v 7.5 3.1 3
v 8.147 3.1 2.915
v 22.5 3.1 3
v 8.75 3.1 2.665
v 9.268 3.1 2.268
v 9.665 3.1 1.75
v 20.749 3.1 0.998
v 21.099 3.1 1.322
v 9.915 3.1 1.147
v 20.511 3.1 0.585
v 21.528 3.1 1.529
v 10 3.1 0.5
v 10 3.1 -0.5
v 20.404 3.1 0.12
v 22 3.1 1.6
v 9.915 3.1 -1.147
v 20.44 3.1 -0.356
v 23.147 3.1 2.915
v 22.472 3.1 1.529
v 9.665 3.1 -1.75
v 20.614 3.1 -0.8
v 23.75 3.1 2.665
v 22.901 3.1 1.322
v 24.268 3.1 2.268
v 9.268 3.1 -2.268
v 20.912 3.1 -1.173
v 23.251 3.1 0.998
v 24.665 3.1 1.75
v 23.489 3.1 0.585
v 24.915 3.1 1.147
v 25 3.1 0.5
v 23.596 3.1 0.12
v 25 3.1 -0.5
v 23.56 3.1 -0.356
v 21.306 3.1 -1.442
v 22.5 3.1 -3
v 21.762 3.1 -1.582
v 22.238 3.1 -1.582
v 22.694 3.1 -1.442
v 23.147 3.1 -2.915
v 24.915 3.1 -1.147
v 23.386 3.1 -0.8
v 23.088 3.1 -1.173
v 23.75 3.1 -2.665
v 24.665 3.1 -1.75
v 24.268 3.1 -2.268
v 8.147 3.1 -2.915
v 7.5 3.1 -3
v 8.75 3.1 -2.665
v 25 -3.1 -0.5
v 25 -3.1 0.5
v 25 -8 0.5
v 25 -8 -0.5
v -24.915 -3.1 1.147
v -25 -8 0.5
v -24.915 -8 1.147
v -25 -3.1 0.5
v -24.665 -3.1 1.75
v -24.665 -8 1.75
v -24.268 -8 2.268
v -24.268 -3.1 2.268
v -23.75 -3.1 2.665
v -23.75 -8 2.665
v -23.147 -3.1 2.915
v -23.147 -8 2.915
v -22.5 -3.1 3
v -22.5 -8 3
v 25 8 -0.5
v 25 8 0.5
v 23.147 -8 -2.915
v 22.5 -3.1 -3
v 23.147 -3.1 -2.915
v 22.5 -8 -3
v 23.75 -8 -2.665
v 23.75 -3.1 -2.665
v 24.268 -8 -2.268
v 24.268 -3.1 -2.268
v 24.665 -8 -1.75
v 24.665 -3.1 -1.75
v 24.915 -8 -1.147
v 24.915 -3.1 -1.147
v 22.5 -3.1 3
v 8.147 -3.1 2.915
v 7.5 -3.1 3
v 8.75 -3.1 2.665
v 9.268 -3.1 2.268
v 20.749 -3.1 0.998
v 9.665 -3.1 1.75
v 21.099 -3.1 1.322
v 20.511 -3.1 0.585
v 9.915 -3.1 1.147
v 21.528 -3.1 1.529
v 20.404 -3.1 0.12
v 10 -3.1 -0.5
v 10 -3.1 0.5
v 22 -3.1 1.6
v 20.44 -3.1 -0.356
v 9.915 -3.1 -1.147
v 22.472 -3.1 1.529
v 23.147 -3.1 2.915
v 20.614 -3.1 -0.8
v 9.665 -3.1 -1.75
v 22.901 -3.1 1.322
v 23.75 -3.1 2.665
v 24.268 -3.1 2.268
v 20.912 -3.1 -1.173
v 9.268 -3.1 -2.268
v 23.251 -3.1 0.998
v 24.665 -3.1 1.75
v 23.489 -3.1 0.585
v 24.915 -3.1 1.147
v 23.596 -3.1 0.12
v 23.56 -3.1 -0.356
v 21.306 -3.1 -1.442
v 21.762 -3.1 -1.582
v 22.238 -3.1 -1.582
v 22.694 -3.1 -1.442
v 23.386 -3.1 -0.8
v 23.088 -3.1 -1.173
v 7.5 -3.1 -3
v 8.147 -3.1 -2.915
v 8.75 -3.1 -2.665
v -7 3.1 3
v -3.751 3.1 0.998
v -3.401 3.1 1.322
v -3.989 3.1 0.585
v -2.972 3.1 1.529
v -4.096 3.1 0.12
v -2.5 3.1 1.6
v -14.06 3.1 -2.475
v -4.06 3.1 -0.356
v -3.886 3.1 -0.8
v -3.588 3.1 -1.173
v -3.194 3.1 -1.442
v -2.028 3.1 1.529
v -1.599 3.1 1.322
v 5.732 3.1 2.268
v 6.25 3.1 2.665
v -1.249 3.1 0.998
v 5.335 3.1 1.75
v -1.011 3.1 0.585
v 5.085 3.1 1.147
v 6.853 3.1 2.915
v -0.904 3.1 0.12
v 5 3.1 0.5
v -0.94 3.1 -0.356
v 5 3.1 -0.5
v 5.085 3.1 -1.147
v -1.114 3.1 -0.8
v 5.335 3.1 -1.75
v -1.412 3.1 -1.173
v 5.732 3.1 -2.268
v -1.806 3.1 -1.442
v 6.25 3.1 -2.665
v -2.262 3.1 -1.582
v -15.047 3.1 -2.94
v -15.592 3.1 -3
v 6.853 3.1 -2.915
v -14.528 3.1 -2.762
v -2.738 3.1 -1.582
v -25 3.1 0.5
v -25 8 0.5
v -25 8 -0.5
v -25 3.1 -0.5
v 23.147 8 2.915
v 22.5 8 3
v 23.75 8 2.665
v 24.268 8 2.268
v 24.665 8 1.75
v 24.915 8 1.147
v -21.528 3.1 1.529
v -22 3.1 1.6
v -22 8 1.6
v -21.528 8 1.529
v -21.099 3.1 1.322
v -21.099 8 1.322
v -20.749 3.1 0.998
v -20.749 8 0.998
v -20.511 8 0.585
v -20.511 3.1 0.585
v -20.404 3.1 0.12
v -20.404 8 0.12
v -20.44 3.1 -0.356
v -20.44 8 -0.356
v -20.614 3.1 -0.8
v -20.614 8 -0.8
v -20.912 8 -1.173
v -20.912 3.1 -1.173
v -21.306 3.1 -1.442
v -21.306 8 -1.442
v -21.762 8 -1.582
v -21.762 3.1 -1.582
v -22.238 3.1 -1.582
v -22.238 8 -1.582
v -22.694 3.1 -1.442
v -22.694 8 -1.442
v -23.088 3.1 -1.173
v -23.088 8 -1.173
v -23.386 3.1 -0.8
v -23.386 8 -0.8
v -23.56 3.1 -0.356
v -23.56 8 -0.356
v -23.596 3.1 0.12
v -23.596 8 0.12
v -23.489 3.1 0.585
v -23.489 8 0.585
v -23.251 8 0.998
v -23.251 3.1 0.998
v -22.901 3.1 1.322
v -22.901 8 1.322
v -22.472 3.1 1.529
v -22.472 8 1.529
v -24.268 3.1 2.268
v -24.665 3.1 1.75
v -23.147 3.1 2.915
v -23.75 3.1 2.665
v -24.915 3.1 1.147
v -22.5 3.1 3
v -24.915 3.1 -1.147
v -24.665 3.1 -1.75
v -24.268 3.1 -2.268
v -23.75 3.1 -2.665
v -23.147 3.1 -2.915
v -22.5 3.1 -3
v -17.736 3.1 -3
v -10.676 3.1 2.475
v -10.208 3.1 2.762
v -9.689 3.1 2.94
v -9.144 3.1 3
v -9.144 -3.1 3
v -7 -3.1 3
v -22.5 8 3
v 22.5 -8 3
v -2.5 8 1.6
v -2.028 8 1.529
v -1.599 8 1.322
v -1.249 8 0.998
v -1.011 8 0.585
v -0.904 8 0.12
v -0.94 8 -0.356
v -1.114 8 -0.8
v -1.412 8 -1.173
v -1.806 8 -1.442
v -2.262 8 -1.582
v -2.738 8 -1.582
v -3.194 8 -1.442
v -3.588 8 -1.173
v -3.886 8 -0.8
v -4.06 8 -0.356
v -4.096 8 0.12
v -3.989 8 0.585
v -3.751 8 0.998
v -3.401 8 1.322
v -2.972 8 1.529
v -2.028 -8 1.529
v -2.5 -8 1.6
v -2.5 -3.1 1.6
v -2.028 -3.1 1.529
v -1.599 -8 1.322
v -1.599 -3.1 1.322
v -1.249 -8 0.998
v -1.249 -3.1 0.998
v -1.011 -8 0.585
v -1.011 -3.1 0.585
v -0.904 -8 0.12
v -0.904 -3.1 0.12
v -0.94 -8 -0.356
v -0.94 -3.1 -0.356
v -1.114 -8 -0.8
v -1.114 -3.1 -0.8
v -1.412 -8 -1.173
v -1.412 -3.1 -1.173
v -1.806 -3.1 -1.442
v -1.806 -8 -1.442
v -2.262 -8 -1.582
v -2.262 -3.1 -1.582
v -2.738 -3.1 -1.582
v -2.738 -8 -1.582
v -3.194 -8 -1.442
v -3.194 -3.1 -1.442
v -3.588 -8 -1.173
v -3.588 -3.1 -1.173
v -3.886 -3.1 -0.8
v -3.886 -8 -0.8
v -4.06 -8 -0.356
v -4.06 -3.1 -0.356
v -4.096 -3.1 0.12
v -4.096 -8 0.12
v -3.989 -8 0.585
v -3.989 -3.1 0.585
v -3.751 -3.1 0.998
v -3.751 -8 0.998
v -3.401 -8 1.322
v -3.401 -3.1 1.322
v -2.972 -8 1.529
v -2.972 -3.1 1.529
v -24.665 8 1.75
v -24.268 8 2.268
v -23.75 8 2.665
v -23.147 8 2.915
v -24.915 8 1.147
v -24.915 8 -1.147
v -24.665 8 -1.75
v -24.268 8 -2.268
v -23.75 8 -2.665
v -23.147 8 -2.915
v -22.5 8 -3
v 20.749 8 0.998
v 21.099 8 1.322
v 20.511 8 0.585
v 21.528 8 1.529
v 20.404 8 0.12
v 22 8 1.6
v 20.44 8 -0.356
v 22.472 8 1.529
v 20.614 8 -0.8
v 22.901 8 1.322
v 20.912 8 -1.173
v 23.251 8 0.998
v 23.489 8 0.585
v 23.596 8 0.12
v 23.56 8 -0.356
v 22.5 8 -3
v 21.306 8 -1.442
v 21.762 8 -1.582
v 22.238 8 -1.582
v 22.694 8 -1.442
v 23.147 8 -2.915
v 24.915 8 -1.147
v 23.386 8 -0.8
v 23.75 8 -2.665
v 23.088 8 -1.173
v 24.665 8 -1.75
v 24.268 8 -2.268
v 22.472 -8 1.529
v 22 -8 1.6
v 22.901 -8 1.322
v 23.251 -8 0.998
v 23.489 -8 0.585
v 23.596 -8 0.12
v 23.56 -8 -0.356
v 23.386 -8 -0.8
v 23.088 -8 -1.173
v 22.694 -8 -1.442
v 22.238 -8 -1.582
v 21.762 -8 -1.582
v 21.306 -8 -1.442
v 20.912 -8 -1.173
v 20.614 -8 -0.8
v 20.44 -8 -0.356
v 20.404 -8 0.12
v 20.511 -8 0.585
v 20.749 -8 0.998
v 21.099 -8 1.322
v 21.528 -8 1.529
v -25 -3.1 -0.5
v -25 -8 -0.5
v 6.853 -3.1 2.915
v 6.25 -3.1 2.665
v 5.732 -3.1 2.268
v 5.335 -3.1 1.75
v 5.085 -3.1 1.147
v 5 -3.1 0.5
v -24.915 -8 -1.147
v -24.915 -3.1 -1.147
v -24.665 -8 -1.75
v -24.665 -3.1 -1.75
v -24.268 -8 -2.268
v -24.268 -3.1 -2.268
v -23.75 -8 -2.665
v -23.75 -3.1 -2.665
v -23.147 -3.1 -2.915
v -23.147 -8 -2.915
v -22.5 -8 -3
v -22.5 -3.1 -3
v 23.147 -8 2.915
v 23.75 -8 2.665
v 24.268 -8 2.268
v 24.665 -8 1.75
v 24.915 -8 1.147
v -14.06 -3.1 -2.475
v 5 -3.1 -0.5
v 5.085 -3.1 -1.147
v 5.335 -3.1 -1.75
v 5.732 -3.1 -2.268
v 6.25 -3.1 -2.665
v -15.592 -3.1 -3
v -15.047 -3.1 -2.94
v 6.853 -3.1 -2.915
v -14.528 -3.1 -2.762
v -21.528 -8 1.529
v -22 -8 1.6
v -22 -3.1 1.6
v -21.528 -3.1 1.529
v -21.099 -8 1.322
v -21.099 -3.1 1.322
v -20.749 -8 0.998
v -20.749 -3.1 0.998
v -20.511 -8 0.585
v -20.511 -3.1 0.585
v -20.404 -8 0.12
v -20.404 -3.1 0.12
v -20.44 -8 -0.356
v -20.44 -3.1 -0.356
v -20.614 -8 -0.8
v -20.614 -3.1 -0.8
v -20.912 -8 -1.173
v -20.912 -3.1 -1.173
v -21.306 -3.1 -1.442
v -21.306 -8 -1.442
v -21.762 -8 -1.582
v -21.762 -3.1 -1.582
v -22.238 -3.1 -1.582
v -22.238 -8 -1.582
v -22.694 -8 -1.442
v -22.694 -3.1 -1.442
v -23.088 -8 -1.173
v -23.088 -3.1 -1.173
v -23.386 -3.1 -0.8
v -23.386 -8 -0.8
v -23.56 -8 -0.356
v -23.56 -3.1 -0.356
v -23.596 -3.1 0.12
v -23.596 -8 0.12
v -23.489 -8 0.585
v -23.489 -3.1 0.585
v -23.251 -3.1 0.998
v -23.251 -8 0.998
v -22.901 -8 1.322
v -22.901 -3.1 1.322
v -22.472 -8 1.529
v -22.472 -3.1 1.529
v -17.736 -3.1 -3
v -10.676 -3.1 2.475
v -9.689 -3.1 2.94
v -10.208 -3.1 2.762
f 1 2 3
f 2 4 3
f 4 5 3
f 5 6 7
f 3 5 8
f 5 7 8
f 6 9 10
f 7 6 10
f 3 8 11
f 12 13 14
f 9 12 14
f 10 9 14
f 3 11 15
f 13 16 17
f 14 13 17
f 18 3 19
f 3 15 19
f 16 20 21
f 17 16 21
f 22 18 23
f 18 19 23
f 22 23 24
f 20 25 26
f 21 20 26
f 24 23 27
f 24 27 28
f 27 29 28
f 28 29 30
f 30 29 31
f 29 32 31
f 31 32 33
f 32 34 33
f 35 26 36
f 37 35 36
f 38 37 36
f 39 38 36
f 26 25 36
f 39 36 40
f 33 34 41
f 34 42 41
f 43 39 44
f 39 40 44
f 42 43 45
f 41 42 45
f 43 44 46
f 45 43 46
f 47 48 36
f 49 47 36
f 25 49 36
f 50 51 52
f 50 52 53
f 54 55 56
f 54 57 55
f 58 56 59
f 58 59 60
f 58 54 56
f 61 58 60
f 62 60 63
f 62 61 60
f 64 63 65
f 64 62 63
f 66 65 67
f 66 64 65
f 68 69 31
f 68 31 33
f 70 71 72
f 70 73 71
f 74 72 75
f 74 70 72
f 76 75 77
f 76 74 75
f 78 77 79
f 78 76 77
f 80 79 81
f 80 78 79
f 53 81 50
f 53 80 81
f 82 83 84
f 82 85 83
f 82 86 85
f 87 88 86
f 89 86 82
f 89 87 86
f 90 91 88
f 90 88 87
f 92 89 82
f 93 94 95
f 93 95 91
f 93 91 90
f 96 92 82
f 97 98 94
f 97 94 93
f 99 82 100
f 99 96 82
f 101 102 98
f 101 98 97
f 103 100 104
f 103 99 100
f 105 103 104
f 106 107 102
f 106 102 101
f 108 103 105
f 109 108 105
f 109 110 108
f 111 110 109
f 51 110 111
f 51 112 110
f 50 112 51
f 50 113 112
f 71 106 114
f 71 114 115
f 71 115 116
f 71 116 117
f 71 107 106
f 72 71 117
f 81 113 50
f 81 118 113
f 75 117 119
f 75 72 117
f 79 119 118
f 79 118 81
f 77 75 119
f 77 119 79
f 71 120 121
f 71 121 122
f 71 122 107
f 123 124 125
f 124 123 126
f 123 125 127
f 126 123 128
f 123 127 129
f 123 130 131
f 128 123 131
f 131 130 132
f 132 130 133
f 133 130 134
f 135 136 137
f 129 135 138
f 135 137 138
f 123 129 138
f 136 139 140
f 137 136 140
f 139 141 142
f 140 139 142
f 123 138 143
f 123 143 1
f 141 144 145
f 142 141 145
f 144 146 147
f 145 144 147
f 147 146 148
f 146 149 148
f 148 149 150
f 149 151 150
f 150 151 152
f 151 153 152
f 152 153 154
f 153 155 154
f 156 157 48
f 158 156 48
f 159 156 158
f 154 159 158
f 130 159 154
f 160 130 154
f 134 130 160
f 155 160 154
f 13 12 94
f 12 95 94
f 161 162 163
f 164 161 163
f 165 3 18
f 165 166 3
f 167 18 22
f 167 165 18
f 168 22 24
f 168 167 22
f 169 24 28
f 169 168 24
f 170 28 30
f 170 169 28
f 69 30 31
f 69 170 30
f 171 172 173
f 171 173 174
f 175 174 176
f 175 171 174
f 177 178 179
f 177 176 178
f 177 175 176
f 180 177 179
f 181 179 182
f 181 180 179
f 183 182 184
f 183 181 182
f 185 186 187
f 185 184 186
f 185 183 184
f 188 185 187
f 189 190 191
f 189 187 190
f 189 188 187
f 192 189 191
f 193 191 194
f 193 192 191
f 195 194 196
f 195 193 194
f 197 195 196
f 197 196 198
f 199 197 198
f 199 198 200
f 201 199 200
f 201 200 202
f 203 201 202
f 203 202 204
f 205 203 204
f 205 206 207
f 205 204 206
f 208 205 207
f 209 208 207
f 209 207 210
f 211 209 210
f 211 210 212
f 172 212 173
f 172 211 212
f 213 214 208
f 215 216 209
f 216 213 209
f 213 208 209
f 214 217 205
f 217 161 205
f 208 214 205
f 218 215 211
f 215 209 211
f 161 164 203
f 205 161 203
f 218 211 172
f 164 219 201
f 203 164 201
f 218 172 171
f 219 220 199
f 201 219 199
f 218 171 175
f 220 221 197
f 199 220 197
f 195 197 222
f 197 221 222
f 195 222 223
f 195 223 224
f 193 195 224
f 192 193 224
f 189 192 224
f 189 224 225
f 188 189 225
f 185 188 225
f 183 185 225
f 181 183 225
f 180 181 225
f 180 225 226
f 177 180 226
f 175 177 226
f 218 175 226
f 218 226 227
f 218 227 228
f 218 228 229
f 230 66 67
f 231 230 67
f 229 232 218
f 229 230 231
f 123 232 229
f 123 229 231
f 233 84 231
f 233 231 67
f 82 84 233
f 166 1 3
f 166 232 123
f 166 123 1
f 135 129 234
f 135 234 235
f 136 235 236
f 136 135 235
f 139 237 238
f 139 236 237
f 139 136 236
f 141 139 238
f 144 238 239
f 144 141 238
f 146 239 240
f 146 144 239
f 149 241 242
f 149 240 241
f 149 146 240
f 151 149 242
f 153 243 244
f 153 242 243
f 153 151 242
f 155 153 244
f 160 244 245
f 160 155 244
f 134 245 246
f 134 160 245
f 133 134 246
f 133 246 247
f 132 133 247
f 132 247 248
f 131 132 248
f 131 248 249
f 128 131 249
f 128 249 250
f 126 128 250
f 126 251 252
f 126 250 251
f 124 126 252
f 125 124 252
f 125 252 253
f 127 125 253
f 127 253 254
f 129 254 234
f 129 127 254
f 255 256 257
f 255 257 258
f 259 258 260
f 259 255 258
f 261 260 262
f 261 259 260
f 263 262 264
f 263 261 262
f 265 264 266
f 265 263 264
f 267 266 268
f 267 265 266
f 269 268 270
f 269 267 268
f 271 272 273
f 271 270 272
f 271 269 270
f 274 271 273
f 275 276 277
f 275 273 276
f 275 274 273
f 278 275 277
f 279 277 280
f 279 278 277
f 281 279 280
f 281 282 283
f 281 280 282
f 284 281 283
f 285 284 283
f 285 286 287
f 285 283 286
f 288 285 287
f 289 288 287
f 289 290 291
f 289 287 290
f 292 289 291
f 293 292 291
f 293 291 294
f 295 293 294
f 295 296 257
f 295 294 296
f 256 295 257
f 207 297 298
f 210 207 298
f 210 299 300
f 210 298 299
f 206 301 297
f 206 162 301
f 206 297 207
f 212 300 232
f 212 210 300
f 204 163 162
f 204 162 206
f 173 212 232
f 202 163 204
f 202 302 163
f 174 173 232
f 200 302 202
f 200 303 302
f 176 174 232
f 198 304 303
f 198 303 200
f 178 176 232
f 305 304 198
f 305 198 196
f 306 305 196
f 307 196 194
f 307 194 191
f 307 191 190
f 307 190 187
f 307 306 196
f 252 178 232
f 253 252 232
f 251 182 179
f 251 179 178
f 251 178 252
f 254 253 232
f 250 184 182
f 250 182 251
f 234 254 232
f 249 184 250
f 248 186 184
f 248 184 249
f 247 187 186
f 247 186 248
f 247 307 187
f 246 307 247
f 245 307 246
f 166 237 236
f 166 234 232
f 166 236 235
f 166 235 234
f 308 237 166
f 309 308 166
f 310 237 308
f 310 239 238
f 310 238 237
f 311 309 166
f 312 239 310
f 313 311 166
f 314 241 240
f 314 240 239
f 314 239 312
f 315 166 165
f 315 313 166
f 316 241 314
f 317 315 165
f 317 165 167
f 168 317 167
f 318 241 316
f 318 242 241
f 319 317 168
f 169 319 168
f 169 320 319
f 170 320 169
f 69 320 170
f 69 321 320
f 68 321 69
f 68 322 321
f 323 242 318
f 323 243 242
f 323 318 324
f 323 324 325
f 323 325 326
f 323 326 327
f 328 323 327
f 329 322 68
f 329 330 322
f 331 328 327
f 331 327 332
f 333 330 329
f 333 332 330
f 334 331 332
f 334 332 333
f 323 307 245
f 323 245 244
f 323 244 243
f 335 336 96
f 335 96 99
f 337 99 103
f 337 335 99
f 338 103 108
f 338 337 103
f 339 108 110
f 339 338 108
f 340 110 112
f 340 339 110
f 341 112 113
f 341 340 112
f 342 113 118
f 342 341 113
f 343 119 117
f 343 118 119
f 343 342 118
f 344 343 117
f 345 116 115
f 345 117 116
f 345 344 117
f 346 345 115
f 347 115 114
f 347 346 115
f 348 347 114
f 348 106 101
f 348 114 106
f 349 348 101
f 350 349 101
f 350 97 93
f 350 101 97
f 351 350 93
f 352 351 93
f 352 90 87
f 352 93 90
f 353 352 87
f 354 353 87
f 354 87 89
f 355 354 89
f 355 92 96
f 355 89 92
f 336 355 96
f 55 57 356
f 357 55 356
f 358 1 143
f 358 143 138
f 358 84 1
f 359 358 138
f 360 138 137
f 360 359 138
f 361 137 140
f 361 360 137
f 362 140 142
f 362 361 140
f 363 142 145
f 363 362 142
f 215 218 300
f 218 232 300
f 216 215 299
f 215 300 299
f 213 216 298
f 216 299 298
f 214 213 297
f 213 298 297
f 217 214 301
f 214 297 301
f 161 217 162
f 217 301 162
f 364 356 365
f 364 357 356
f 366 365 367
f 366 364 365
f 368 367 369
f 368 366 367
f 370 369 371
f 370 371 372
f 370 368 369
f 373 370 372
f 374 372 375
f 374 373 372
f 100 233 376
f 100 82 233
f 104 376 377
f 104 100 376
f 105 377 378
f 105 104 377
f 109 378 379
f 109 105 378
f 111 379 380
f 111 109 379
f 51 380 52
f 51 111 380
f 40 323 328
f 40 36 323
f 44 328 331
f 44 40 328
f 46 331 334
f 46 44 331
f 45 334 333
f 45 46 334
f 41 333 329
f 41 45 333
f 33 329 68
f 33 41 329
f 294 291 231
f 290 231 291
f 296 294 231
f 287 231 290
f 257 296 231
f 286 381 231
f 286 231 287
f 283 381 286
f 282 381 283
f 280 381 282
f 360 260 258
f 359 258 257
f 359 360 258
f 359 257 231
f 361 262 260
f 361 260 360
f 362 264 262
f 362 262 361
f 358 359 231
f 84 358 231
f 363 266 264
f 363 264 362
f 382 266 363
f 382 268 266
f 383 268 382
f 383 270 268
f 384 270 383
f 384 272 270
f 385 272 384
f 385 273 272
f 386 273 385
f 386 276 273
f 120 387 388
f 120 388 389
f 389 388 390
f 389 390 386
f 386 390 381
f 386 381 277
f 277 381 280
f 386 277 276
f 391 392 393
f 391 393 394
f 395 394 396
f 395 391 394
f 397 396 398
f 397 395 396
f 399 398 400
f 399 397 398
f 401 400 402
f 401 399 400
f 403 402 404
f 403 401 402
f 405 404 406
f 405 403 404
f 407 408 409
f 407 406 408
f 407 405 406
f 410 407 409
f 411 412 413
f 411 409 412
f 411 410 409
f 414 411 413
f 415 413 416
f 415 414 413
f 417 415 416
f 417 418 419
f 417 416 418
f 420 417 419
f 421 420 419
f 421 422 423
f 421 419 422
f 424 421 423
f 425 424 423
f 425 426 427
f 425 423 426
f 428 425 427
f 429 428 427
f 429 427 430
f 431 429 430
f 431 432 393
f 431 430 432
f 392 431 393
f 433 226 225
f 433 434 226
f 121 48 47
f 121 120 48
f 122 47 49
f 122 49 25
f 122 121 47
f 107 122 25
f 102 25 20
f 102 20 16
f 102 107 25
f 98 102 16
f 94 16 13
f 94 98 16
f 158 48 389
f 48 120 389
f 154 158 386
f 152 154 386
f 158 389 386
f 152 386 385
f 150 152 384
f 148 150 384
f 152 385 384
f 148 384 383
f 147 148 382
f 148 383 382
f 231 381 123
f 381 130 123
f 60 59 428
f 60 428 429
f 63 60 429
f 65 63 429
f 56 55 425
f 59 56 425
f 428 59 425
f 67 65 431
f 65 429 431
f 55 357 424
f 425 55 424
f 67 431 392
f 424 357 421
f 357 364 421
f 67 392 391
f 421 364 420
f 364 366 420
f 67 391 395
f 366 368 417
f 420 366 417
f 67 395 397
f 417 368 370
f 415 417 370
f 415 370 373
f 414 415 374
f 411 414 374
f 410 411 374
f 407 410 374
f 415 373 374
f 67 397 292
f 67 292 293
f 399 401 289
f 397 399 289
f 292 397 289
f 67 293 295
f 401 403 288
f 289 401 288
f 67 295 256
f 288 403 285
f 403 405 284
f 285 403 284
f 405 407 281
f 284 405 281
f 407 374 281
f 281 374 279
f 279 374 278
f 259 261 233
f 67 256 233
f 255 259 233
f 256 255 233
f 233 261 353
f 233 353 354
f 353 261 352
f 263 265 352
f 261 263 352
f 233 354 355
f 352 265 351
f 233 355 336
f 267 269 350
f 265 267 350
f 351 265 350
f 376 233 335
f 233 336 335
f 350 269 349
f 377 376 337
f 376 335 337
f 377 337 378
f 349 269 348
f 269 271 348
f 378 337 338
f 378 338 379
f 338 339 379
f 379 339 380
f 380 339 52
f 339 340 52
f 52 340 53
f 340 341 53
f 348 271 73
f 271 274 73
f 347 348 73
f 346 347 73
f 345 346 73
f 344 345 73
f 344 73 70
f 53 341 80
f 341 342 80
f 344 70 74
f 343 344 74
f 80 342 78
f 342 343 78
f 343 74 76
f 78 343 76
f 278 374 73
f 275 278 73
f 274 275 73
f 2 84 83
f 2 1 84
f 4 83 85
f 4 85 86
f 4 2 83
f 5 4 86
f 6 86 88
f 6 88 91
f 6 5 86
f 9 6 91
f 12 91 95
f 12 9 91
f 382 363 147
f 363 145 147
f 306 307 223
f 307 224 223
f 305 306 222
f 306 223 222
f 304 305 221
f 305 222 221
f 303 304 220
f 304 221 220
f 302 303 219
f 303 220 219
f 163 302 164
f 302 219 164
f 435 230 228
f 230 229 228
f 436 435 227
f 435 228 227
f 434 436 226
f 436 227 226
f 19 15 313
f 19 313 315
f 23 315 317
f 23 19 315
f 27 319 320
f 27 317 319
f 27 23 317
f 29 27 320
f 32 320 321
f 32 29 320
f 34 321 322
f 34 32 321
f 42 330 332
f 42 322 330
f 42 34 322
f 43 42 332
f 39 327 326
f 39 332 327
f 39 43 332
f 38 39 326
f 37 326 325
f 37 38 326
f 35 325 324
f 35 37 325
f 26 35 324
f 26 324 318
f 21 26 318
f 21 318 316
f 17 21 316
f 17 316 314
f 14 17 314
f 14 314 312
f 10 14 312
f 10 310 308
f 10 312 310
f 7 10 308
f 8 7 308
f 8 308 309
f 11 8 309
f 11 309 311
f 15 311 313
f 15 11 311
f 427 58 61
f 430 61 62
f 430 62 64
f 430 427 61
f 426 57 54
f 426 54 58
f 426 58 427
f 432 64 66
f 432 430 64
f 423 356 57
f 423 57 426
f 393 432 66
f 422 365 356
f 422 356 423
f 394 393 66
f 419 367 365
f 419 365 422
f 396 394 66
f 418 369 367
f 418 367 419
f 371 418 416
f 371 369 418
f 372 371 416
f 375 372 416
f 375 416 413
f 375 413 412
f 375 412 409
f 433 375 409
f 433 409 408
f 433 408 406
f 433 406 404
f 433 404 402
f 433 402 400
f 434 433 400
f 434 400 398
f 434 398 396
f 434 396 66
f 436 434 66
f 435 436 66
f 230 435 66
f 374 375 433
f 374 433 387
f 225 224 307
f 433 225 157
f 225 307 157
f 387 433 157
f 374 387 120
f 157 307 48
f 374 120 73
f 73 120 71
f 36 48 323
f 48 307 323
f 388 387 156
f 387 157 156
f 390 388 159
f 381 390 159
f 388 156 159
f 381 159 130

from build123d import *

# Parameters (mm, degrees)
SKETCH1_W               = 50
SKETCH1_H               = 6
BOSS_EXTRUDE1_DEPTH     = 8
SKETCH2_W               = 15
SKETCH2_H               = 6
CUT_EXTRUDE1_DEPTH      = 3.1
CUT_EXTRUDE2_DEPTH      = 27.419689627
CUT_EXTRUDE2_DEPTH_BACK = 27.419689627
SKETCH3_R               = 1.6
FILLET1_R               = 2.5


with BuildPart() as part:
    # Sketch1 → Boss-Extrude1 (new, symmetric)
    with BuildSketch(Plane(origin=(0, 0, 0), x_dir=(1, 0, 0), z_dir=(0, 1, 0))):
        Rectangle(SKETCH1_W, SKETCH1_H)
    extrude(amount=BOSS_EXTRUDE1_DEPTH, both=True)

    # Sketch2 → Cut-Extrude1 (cut, symmetric)
    with BuildSketch(Plane(origin=(0, 0, 0), x_dir=(1, 0, 0), z_dir=(0, 1, 0))):
        Polygon((-25, -3), (-10, -3), (-17.736081979, 3), (-25, 3), align=None)
        with Locations((17.5, 0)):
            Rectangle(SKETCH2_W, SKETCH2_H)
        Polygon((5, 3), (-14.736081979, 3), (-7, -3), (5, -3), align=None)
    extrude(amount=CUT_EXTRUDE1_DEPTH, both=True, mode=Mode.SUBTRACT)

    # Sketch3 → Cut-Extrude2 (cut, two sides: drawn at the far end of the back side and taken through both)
    with BuildSketch(Plane(origin=(0, 0, 0), x_dir=(1, 0, 0), z_dir=(0, 1, 0)).offset(-CUT_EXTRUDE2_DEPTH_BACK)):
        with Locations(Location((-22, 0, 0), (0, 0, 270))):
            Circle(SKETCH3_R)
        with Locations(Location((22, 0, 0), (0, 0, 270))):
            Circle(SKETCH3_R)
        with Locations(Location((-2.5, 0, 0), (0, 0, 270))):
            Circle(SKETCH3_R)
    extrude(amount=CUT_EXTRUDE2_DEPTH + CUT_EXTRUDE2_DEPTH_BACK, mode=Mode.SUBTRACT)

    # Fillet1
    fillet1_edges = [part.edges().sort_by_distance(p)[0] for p in [
        (25, -5.55, 3),
        (-25, -5.55, 3),
        (-25, -5.55, -3),
        (25, -5.55, -3),
        (5, 0, -3),
        (5, 0, 3),
        (-14.736081979, 0, -3),
        (10, 0, 3),
        (10, 0, -3),
        (-10, 0, 3),
        (25, 5.55, 3),
        (-25, 5.55, 3),
        (-25, 5.55, -3),
        (25, 5.55, -3),
    ]]
    fillet(fillet1_edges, radius=FILLET1_R - 0.0001)  # a hair under: the kernel refuses the full size


solid = part.part
